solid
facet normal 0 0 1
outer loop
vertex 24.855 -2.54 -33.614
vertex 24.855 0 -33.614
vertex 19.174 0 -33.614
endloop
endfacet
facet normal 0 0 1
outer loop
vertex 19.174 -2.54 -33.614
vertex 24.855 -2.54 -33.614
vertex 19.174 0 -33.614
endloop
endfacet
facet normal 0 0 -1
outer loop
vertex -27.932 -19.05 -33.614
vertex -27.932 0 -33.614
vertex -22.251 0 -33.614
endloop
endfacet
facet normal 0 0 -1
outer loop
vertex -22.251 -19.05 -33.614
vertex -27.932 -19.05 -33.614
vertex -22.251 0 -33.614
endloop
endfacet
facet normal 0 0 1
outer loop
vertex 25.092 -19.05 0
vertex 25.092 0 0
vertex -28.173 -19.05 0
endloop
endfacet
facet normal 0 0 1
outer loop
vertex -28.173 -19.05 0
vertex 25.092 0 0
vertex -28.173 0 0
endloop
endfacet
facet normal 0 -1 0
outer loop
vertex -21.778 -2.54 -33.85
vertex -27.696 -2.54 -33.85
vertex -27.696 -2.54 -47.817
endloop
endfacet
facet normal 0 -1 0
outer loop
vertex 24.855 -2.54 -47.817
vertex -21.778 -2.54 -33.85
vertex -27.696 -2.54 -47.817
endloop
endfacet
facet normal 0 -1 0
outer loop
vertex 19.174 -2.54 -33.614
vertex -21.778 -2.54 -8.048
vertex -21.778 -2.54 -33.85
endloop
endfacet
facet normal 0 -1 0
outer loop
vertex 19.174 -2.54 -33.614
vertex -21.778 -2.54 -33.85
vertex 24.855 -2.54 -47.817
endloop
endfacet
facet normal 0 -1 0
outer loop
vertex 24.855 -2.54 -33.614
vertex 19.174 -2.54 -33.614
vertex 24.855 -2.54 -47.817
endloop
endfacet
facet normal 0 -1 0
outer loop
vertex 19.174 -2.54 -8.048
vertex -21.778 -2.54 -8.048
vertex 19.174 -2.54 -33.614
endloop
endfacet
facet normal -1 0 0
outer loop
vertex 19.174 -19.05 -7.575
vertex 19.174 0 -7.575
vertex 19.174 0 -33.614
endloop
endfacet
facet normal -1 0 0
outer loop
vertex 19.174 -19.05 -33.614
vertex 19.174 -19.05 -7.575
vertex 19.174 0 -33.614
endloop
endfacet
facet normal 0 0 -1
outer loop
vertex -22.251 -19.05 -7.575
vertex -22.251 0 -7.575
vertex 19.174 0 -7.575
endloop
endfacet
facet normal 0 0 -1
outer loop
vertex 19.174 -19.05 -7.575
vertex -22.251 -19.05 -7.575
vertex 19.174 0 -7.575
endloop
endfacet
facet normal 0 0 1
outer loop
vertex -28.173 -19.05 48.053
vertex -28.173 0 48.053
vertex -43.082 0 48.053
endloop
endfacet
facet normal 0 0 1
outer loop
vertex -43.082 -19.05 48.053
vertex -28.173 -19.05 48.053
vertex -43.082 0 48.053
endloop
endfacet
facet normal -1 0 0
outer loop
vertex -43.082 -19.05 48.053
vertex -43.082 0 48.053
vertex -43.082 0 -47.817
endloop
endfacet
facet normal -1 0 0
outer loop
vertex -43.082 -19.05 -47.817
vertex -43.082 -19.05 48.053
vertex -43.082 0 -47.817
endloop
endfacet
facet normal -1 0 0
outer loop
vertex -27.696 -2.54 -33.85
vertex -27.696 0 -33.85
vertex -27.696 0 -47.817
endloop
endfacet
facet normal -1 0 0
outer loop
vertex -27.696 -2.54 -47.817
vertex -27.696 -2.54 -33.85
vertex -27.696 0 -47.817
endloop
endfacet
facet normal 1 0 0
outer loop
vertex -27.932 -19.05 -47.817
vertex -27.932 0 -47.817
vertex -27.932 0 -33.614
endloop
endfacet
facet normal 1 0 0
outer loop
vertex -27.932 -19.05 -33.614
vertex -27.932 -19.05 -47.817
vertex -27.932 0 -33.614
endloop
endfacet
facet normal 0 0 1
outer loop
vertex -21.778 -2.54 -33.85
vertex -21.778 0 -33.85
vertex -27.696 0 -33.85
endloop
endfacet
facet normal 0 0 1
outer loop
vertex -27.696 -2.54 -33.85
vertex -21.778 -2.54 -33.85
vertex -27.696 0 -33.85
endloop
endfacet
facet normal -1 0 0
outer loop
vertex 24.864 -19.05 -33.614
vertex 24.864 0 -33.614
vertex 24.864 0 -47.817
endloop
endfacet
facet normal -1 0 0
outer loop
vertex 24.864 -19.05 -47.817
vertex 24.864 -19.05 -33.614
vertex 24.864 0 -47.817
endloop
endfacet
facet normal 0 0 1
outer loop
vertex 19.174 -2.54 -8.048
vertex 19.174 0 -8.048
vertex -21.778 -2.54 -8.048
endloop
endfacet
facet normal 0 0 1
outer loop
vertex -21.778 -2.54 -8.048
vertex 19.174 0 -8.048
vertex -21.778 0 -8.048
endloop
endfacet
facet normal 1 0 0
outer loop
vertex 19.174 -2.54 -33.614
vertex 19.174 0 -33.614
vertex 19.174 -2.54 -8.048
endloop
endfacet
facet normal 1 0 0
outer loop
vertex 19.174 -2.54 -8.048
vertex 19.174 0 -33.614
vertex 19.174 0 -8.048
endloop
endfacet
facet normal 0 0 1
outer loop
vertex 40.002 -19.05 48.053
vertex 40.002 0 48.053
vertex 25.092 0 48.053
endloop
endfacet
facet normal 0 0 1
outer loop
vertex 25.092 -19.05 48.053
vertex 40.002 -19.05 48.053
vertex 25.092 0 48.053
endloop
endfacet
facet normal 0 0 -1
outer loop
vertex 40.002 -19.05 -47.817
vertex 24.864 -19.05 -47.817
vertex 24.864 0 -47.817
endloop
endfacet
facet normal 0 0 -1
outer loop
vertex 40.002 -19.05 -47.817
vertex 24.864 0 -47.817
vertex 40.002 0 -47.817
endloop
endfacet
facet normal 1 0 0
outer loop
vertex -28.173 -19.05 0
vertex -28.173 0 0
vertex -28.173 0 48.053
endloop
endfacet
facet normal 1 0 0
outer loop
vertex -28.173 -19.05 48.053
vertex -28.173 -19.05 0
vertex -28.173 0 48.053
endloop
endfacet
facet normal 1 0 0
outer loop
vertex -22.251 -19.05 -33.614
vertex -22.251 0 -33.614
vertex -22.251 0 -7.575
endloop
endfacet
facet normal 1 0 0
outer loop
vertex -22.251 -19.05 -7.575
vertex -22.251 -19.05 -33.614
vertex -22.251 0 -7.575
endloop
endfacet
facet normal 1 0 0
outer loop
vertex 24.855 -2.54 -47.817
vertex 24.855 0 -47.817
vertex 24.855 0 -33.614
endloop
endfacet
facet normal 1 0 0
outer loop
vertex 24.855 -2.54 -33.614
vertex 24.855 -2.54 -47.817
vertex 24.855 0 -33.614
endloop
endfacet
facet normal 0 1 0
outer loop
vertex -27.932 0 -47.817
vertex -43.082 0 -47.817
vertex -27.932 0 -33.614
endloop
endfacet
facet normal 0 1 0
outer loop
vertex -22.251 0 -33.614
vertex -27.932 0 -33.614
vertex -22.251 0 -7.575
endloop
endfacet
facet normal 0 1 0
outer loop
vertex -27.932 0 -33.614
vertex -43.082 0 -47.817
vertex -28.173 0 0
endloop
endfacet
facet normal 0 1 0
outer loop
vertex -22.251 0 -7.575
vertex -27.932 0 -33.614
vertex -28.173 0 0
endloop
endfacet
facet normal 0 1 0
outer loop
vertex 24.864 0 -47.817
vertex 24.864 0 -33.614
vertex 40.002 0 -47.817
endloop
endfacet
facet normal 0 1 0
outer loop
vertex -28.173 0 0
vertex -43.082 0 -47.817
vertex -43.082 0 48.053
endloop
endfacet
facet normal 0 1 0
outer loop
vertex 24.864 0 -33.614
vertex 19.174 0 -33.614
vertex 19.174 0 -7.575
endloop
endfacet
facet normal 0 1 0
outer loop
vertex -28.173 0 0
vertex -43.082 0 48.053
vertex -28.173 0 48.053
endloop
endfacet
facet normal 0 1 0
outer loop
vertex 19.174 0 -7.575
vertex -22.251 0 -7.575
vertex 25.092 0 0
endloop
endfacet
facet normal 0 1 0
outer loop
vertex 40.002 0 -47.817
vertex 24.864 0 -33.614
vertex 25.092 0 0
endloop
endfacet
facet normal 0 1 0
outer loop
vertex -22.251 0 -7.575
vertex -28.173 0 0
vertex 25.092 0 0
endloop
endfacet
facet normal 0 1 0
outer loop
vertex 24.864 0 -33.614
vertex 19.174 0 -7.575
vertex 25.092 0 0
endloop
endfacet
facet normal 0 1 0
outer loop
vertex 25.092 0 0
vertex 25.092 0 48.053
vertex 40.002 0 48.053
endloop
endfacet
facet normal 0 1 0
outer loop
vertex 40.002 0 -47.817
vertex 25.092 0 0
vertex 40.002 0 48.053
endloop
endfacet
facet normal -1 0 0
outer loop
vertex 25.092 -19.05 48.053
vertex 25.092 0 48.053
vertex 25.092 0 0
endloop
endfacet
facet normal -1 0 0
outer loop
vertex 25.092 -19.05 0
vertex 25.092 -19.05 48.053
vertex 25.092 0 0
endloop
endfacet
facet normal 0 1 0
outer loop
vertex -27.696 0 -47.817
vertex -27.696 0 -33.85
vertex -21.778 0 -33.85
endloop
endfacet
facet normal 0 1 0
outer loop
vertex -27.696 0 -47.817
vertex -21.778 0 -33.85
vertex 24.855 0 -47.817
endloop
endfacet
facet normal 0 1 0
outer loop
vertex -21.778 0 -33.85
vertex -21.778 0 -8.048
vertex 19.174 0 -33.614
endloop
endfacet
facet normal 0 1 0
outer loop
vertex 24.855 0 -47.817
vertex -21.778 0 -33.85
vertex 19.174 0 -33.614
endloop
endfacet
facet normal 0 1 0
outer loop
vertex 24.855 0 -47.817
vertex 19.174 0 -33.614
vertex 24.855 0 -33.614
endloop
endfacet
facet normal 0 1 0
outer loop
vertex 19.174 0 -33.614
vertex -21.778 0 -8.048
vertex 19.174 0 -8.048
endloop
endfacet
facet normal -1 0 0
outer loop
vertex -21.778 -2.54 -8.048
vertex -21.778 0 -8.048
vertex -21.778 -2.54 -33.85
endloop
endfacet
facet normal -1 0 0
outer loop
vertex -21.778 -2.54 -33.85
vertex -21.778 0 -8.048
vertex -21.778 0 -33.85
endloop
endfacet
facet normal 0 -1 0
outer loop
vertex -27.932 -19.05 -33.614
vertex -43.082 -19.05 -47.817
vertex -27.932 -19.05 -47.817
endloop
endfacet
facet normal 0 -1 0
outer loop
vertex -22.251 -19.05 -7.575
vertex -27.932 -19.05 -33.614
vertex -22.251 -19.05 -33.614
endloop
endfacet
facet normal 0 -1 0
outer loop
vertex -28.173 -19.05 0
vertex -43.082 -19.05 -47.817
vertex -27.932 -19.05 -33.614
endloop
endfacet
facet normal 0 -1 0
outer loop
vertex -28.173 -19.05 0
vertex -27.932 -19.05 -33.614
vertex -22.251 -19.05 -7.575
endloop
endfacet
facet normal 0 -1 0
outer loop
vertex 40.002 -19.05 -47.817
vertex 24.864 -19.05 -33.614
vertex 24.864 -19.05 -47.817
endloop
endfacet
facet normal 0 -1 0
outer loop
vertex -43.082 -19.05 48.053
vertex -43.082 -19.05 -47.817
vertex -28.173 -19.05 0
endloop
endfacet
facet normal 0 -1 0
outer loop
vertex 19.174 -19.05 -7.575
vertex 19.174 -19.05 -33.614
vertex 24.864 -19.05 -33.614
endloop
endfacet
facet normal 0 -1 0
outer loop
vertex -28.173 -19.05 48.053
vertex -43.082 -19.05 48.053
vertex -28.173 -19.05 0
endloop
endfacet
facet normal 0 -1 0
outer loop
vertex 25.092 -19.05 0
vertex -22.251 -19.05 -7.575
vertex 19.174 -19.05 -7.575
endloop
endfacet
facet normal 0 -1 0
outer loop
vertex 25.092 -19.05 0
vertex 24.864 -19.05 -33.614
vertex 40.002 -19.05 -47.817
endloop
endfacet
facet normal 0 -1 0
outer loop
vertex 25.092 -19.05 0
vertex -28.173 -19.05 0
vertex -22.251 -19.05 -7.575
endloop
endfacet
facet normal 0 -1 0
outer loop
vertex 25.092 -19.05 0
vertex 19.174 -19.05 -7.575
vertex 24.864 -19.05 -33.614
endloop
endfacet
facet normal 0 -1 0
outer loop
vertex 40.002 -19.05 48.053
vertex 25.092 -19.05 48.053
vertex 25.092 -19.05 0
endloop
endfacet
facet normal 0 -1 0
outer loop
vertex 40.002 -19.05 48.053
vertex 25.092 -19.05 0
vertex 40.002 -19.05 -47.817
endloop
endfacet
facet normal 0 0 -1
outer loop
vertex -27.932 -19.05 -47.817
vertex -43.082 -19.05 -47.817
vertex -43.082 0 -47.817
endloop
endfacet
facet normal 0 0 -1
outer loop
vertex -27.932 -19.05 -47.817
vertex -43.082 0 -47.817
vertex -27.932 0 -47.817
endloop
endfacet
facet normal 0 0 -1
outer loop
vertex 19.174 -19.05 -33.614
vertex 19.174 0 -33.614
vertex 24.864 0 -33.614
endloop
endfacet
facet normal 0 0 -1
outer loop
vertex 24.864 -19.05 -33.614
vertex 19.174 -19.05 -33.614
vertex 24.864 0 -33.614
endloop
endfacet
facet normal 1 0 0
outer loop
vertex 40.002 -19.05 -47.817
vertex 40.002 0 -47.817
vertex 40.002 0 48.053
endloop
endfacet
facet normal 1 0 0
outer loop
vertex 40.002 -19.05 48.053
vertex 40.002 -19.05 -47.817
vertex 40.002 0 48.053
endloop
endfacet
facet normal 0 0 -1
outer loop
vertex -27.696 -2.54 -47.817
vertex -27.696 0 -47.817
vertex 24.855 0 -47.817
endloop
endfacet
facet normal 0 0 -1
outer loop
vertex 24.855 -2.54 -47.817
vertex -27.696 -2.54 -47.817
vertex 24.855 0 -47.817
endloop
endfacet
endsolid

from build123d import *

# Parameters (mm, degrees)
F1_DEPTH = 19.05
F3_DEPTH = 2.54


with BuildPart() as f1:
    # F0 (on Front) → F1 (new body)
    with BuildSketch(Plane.XZ):
        Polygon((-28.172508, 48.053343), (-43.082308, 48.053343), (-43.082308, -47.816627), (-27.932484, -47.816627), (-27.932484, -33.613667), (-22.251301, -33.613667), (-22.251301, -7.574911), (19.173995, -7.574911), (19.173995, -33.613667), (24.863595, -33.613667), (24.863595, -47.816627), (40.001995, -47.816627), (40.001995, 48.053343), (25.091892, 48.053343), (25.091892, 0), (-28.172508, 0), align=None)
    extrude(amount=F1_DEPTH)


with BuildPart() as f3:
    # F2 (on Front) → F3 (new body)
    with BuildSketch(Plane.XZ):
        Polygon((-27.695769, -33.850387), (-27.695769, -47.816627), (24.855178, -47.816627), (24.855178, -33.613667), (19.173995, -33.613667), (19.173995, -8.048343), (-21.77787, -8.048343), (-21.77787, -33.850387), align=None)
    extrude(amount=F3_DEPTH)


solid = Compound([f1.part, f3.part])
